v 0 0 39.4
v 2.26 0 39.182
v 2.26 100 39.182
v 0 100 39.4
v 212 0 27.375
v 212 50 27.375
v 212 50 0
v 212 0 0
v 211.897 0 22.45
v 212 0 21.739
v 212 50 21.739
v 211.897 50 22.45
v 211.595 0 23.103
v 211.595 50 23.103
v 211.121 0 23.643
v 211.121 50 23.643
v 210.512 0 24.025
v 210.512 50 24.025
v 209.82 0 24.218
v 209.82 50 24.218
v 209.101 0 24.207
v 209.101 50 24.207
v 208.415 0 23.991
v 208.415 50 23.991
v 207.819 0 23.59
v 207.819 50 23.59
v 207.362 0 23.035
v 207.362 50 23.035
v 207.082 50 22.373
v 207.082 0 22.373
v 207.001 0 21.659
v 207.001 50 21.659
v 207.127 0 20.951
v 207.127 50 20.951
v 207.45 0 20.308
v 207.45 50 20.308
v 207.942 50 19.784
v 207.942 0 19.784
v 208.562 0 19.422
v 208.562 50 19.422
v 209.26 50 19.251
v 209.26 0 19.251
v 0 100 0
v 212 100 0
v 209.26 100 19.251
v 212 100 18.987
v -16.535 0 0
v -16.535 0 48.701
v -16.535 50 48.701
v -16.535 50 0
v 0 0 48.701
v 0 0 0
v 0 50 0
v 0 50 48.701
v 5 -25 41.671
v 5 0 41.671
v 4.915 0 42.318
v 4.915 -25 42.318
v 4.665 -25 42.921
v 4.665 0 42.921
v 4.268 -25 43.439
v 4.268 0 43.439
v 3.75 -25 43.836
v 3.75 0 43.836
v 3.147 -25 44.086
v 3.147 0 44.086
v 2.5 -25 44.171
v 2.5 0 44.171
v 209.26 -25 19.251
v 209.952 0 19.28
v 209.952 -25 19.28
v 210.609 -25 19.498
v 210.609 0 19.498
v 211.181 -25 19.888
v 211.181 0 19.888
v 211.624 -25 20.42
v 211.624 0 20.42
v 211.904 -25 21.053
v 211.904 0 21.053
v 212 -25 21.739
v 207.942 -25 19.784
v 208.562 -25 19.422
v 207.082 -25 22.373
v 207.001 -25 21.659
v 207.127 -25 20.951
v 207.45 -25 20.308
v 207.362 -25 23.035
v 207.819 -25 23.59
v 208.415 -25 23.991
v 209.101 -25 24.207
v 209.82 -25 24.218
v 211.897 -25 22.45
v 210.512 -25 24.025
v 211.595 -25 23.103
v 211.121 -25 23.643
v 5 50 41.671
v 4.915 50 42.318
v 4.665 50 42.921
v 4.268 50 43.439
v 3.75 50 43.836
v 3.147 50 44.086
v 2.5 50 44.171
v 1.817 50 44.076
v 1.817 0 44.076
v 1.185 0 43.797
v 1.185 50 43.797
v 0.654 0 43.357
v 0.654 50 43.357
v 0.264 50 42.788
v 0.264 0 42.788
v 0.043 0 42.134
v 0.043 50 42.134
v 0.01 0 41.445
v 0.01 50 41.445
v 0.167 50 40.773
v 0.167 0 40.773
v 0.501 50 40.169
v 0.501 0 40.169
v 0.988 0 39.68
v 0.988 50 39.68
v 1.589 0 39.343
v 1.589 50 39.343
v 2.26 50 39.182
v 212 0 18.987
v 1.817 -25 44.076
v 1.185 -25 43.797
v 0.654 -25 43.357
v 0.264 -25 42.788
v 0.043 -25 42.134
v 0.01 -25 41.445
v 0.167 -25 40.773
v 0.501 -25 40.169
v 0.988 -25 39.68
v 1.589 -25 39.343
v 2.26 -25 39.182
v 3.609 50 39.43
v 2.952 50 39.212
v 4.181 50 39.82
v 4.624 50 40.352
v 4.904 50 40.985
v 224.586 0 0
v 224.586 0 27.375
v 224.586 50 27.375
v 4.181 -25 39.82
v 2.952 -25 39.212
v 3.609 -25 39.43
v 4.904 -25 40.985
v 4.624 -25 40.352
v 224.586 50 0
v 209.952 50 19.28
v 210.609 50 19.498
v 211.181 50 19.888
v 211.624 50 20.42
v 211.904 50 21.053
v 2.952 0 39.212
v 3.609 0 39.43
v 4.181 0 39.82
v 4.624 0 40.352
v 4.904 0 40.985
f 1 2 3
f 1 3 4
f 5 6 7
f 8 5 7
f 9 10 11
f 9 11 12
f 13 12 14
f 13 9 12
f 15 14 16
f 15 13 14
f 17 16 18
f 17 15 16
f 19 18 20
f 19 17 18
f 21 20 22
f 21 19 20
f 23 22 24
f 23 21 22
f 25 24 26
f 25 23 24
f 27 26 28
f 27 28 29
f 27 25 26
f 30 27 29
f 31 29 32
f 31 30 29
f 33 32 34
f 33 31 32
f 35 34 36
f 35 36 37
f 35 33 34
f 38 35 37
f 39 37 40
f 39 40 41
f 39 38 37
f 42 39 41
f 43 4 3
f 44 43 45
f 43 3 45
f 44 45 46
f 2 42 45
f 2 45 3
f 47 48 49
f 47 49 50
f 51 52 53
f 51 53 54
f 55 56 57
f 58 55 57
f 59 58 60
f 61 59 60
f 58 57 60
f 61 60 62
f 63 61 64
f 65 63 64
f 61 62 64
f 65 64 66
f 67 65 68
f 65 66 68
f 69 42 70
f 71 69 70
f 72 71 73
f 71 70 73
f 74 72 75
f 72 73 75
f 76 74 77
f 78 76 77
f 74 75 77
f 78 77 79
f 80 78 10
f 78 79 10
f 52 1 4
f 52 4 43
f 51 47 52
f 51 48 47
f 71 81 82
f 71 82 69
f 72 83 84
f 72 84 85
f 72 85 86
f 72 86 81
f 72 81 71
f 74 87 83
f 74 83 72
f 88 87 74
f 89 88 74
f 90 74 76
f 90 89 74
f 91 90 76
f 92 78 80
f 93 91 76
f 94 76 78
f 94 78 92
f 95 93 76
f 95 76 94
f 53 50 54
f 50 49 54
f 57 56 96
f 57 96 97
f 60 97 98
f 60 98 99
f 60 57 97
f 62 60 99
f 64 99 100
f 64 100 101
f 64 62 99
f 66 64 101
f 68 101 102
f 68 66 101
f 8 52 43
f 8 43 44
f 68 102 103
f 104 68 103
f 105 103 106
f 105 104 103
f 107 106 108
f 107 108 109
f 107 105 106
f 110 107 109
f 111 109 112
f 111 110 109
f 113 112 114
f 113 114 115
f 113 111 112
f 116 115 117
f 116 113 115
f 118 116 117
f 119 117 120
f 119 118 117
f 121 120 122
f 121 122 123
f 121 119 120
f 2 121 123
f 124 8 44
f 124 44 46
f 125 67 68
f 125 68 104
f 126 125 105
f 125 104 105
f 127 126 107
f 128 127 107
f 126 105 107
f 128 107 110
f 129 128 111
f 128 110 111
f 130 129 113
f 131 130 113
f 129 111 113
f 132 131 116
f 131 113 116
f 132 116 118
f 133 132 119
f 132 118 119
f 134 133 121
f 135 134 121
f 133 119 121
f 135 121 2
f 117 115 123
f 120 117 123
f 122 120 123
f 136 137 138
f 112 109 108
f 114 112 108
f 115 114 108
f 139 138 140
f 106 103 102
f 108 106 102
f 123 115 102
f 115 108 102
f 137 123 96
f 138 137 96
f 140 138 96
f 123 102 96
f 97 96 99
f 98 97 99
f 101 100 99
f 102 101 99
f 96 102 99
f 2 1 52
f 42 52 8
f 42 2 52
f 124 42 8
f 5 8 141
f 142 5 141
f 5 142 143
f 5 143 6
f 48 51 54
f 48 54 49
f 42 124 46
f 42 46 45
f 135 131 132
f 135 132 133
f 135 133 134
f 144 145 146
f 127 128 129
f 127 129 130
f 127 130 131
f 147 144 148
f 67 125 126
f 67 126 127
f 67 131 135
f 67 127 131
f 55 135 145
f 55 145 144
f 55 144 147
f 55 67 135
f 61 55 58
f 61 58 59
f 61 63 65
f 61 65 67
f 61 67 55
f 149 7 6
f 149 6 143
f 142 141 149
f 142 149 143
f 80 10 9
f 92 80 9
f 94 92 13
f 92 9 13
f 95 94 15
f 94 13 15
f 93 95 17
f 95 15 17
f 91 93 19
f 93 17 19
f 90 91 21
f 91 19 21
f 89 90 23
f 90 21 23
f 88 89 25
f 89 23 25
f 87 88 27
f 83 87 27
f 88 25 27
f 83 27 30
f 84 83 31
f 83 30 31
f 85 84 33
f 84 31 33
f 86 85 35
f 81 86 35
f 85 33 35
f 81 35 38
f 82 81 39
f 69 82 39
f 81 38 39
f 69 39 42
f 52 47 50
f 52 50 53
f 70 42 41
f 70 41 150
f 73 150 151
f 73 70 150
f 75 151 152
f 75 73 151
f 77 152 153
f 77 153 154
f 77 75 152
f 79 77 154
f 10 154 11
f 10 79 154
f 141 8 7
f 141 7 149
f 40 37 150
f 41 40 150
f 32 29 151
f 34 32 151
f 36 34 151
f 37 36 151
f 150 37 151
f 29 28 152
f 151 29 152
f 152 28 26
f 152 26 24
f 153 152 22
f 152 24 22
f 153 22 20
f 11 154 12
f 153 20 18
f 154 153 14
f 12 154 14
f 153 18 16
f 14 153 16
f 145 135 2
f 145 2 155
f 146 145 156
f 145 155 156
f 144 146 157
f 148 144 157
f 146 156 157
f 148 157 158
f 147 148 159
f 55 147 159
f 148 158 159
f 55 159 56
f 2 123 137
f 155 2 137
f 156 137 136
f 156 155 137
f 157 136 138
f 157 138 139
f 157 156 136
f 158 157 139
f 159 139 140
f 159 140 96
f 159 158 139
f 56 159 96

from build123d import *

# Parameters (mm, degrees)
F1_DEPTH      = 100
F2_DEPTH      = 25
F2_DEPTH_BACK = 50
F4_DEPTH      = 50


with BuildPart() as f1:
    # F0 (on Front) → F1 (new body)
    with BuildSketch(Plane.XZ):
        Polygon((0, 39.4), (0, 0), (212, 0), (212, 18.9867217821), (209.2603853098, 19.2505166731), (2.2603857104, 39.1823496114), align=None)
    extrude(amount=-F1_DEPTH)


with BuildPart() as f2:
    # F0 (on Front) → F2 (new body, two sides)
    with BuildSketch(Plane.XZ) as f2_sk:
        with BuildLine():
            ThreePointArc((2.5, 44.1708401161), (0.0028790316, 41.7907853914), (2.2603857104, 39.1823496114))
            ThreePointArc((2.2603857104, 39.1823496114), (4.1809170527, 39.8202948284), (5, 41.6708401161))
            ThreePointArc((5, 41.6708401161), (4.267766953, 43.4386070691), (2.5, 44.1708401161))
        make_face()
    extrude(amount=F2_DEPTH)
    extrude(f2_sk.sketch, amount=-F2_DEPTH_BACK)


with BuildPart() as f2b:
    # F0 (on Front) → F2, piece 2 (new body, two sides)
    with BuildSketch(Plane.XZ) as f2_2_sk:
        with BuildLine():
            ThreePointArc((212, 21.7390071392), (207.8190830963, 23.5895525623), (209.2603853098, 19.2505166731))
            ThreePointArc((209.2603853098, 19.2505166731), (211.1809169037, 19.8884617162), (212, 21.7390071392))
        make_face()
    extrude(amount=F2_DEPTH)
    extrude(f2_2_sk.sketch, amount=-F2_DEPTH_BACK)


with BuildPart() as f4:
    # F3 (on face) → F4 (new body)
    with BuildSketch(Plane.XZ):
        Polygon((212, 18.9867217821), (212, 0), (224.5859801769, 0), (224.5859801769, 27.3749008775), (212, 27.3749008775), align=None)
    extrude(amount=-F4_DEPTH)


with BuildPart() as f4b:
    # F3 (on face) → F4, piece 2 (new body)
    with BuildSketch(Plane.XZ):
        Polygon((-16.5345836431, 0), (0, 0), (0, 39.4), (0, 48.700671643), (-16.5345836431, 48.700671643), align=None)
    extrude(amount=-F4_DEPTH)


solid = Compound([f1.part, f2.part, f2b.part, f4.part, f4b.part])
